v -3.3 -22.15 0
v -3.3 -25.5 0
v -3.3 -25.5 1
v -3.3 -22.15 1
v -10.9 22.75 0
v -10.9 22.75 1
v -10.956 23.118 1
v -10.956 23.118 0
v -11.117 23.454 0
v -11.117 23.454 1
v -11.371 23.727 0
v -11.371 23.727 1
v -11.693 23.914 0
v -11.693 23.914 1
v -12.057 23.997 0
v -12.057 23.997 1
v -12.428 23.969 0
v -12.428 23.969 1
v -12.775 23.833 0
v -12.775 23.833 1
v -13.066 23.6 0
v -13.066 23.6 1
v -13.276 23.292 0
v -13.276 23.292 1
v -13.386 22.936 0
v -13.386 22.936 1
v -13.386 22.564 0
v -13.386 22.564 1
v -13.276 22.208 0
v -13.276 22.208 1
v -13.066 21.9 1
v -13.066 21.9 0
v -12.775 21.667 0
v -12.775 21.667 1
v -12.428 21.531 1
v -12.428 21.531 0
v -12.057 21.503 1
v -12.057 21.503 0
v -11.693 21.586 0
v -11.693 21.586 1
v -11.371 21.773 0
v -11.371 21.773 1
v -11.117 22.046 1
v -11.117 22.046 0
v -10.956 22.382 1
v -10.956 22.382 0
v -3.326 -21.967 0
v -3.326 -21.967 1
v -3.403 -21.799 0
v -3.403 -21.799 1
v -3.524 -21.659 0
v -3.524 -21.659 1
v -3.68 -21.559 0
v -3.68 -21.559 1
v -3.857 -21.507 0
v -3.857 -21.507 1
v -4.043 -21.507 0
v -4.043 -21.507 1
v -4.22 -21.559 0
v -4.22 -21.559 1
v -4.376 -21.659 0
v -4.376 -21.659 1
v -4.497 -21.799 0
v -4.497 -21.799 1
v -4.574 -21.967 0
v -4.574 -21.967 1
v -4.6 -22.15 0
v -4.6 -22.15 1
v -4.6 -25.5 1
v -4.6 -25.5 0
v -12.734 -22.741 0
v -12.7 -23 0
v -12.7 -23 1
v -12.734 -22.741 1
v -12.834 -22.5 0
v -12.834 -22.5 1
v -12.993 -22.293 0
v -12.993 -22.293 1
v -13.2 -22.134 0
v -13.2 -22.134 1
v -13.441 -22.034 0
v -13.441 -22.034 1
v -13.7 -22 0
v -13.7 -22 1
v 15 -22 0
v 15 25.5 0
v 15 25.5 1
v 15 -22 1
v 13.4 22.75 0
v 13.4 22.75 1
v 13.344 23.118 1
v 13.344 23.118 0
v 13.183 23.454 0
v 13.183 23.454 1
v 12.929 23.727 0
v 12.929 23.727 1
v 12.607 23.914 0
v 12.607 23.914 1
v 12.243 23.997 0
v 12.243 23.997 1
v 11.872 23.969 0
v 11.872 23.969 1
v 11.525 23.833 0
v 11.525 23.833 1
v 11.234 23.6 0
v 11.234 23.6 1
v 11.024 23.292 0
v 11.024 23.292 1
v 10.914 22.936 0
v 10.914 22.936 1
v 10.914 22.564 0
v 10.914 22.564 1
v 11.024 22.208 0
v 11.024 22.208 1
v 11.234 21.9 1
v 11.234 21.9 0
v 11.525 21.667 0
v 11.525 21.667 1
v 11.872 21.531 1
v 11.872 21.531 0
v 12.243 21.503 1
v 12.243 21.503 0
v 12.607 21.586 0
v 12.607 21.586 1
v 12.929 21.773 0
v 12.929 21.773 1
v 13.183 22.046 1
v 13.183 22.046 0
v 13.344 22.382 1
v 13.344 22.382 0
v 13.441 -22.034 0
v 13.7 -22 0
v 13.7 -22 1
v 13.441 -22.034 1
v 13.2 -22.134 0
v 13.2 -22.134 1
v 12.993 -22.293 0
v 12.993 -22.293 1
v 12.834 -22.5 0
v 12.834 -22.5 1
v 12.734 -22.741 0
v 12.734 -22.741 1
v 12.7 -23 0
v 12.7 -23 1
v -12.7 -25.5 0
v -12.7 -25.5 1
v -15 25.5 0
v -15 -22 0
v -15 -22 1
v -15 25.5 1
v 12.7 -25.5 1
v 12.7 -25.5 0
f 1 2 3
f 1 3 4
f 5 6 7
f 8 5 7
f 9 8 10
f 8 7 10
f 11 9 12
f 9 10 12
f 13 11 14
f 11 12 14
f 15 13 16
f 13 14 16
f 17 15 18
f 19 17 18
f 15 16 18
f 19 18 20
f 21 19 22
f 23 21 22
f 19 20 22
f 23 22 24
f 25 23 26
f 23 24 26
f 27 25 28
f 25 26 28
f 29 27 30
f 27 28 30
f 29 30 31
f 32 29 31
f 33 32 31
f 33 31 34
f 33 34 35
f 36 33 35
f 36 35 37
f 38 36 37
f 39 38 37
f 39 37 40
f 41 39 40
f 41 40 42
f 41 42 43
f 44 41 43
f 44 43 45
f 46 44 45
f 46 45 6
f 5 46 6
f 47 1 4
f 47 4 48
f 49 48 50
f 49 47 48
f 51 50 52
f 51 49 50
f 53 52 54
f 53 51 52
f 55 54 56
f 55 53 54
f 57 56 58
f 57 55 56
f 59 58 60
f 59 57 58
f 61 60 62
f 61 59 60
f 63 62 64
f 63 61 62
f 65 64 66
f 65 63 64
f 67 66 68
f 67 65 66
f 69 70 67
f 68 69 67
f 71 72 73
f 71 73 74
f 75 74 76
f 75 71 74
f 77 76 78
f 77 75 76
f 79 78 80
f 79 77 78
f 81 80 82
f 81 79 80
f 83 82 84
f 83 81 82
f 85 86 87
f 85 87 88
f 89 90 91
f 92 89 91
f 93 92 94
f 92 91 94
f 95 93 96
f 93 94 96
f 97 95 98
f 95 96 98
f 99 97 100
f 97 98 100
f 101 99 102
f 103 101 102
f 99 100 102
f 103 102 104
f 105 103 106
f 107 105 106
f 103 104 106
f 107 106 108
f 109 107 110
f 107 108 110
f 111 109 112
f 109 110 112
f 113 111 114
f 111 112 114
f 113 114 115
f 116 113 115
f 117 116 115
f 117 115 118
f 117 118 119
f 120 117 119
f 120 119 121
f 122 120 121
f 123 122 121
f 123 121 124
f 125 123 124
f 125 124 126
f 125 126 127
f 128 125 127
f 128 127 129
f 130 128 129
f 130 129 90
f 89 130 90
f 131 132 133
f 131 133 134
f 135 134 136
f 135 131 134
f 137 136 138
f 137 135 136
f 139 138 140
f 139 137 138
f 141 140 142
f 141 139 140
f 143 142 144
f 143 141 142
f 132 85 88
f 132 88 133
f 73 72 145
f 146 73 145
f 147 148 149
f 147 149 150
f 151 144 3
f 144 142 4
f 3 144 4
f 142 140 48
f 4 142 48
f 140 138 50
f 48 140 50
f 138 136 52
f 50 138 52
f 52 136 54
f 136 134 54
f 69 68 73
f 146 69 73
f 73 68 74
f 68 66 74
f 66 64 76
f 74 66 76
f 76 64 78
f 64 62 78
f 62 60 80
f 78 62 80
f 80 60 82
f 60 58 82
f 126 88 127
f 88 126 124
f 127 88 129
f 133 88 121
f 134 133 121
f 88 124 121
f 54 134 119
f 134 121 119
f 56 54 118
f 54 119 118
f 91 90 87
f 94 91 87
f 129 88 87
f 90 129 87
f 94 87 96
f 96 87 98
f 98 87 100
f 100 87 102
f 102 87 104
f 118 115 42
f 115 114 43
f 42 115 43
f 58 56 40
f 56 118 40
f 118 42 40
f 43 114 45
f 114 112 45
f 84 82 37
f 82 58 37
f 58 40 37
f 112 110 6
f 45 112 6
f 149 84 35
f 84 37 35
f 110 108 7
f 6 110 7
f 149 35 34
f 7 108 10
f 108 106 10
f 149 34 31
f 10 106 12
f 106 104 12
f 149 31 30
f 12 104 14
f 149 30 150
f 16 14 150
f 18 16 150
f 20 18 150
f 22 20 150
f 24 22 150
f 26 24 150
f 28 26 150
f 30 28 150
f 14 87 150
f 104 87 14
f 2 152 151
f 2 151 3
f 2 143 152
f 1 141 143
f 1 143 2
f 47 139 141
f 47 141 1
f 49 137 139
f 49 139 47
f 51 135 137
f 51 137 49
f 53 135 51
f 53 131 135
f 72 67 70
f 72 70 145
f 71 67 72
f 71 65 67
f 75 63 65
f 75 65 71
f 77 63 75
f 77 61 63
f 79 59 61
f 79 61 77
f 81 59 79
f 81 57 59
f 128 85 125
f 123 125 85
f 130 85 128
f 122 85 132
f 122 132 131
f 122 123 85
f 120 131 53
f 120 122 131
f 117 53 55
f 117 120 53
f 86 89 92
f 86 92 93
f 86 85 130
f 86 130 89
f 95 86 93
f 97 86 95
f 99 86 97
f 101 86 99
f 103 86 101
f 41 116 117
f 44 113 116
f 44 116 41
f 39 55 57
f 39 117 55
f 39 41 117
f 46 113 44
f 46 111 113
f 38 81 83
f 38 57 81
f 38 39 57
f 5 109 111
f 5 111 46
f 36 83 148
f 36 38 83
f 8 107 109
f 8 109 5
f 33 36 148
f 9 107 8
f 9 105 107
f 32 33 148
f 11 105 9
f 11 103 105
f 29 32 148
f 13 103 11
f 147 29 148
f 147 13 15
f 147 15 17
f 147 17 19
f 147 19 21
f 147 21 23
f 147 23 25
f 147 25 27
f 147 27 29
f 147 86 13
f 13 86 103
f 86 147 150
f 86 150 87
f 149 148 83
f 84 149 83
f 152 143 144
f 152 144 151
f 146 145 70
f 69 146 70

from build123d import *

# Parameters (mm, degrees)
PAD_DEPTH    = 1
SKETCH001_R  = 1.25
POCKET_DEPTH = 1.001


with BuildPart() as part:
    # Sketch → Pad (new body)
    with BuildSketch(Plane.XY):
        with BuildLine():
            Line((-15, -22), (-15, 25.5))
            Line((-15, 25.5), (15, 25.5))
            Line((15, 25.5), (15, -22))
            Line((15, -22), (13.7, -22))
            ThreePointArc((13.7, -22), (12.992893, -22.292893), (12.7, -23))
            Line((12.7, -23), (12.7, -25.5))
            Line((12.7, -25.5), (-3.3, -25.5))
            Line((-3.3, -25.5), (-3.3, -22.15))
            ThreePointArc((-3.3, -22.15), (-3.95, -21.5), (-4.6, -22.15))
            Line((-4.6, -25.5), (-4.6, -22.15))
            Line((-12.7, -25.5), (-4.6, -25.5))
            Line((-12.7, -23), (-12.7, -25.5))
            ThreePointArc((-12.7, -23), (-12.992893, -22.292893), (-13.7, -22))
            Line((-15, -22), (-13.7, -22))
        make_face()
    extrude(amount=PAD_DEPTH)

    # Sketch001 (on Face16 of Pad) → Pocket (cut, through all)
    with BuildSketch(Plane.XY.offset(1)):
        with Locations((-12.15, 22.75)):
            Circle(SKETCH001_R)
        with Locations((12.15, 22.75)):
            Circle(SKETCH001_R)
    extrude(amount=-POCKET_DEPTH, mode=Mode.SUBTRACT)


solid = part.part
